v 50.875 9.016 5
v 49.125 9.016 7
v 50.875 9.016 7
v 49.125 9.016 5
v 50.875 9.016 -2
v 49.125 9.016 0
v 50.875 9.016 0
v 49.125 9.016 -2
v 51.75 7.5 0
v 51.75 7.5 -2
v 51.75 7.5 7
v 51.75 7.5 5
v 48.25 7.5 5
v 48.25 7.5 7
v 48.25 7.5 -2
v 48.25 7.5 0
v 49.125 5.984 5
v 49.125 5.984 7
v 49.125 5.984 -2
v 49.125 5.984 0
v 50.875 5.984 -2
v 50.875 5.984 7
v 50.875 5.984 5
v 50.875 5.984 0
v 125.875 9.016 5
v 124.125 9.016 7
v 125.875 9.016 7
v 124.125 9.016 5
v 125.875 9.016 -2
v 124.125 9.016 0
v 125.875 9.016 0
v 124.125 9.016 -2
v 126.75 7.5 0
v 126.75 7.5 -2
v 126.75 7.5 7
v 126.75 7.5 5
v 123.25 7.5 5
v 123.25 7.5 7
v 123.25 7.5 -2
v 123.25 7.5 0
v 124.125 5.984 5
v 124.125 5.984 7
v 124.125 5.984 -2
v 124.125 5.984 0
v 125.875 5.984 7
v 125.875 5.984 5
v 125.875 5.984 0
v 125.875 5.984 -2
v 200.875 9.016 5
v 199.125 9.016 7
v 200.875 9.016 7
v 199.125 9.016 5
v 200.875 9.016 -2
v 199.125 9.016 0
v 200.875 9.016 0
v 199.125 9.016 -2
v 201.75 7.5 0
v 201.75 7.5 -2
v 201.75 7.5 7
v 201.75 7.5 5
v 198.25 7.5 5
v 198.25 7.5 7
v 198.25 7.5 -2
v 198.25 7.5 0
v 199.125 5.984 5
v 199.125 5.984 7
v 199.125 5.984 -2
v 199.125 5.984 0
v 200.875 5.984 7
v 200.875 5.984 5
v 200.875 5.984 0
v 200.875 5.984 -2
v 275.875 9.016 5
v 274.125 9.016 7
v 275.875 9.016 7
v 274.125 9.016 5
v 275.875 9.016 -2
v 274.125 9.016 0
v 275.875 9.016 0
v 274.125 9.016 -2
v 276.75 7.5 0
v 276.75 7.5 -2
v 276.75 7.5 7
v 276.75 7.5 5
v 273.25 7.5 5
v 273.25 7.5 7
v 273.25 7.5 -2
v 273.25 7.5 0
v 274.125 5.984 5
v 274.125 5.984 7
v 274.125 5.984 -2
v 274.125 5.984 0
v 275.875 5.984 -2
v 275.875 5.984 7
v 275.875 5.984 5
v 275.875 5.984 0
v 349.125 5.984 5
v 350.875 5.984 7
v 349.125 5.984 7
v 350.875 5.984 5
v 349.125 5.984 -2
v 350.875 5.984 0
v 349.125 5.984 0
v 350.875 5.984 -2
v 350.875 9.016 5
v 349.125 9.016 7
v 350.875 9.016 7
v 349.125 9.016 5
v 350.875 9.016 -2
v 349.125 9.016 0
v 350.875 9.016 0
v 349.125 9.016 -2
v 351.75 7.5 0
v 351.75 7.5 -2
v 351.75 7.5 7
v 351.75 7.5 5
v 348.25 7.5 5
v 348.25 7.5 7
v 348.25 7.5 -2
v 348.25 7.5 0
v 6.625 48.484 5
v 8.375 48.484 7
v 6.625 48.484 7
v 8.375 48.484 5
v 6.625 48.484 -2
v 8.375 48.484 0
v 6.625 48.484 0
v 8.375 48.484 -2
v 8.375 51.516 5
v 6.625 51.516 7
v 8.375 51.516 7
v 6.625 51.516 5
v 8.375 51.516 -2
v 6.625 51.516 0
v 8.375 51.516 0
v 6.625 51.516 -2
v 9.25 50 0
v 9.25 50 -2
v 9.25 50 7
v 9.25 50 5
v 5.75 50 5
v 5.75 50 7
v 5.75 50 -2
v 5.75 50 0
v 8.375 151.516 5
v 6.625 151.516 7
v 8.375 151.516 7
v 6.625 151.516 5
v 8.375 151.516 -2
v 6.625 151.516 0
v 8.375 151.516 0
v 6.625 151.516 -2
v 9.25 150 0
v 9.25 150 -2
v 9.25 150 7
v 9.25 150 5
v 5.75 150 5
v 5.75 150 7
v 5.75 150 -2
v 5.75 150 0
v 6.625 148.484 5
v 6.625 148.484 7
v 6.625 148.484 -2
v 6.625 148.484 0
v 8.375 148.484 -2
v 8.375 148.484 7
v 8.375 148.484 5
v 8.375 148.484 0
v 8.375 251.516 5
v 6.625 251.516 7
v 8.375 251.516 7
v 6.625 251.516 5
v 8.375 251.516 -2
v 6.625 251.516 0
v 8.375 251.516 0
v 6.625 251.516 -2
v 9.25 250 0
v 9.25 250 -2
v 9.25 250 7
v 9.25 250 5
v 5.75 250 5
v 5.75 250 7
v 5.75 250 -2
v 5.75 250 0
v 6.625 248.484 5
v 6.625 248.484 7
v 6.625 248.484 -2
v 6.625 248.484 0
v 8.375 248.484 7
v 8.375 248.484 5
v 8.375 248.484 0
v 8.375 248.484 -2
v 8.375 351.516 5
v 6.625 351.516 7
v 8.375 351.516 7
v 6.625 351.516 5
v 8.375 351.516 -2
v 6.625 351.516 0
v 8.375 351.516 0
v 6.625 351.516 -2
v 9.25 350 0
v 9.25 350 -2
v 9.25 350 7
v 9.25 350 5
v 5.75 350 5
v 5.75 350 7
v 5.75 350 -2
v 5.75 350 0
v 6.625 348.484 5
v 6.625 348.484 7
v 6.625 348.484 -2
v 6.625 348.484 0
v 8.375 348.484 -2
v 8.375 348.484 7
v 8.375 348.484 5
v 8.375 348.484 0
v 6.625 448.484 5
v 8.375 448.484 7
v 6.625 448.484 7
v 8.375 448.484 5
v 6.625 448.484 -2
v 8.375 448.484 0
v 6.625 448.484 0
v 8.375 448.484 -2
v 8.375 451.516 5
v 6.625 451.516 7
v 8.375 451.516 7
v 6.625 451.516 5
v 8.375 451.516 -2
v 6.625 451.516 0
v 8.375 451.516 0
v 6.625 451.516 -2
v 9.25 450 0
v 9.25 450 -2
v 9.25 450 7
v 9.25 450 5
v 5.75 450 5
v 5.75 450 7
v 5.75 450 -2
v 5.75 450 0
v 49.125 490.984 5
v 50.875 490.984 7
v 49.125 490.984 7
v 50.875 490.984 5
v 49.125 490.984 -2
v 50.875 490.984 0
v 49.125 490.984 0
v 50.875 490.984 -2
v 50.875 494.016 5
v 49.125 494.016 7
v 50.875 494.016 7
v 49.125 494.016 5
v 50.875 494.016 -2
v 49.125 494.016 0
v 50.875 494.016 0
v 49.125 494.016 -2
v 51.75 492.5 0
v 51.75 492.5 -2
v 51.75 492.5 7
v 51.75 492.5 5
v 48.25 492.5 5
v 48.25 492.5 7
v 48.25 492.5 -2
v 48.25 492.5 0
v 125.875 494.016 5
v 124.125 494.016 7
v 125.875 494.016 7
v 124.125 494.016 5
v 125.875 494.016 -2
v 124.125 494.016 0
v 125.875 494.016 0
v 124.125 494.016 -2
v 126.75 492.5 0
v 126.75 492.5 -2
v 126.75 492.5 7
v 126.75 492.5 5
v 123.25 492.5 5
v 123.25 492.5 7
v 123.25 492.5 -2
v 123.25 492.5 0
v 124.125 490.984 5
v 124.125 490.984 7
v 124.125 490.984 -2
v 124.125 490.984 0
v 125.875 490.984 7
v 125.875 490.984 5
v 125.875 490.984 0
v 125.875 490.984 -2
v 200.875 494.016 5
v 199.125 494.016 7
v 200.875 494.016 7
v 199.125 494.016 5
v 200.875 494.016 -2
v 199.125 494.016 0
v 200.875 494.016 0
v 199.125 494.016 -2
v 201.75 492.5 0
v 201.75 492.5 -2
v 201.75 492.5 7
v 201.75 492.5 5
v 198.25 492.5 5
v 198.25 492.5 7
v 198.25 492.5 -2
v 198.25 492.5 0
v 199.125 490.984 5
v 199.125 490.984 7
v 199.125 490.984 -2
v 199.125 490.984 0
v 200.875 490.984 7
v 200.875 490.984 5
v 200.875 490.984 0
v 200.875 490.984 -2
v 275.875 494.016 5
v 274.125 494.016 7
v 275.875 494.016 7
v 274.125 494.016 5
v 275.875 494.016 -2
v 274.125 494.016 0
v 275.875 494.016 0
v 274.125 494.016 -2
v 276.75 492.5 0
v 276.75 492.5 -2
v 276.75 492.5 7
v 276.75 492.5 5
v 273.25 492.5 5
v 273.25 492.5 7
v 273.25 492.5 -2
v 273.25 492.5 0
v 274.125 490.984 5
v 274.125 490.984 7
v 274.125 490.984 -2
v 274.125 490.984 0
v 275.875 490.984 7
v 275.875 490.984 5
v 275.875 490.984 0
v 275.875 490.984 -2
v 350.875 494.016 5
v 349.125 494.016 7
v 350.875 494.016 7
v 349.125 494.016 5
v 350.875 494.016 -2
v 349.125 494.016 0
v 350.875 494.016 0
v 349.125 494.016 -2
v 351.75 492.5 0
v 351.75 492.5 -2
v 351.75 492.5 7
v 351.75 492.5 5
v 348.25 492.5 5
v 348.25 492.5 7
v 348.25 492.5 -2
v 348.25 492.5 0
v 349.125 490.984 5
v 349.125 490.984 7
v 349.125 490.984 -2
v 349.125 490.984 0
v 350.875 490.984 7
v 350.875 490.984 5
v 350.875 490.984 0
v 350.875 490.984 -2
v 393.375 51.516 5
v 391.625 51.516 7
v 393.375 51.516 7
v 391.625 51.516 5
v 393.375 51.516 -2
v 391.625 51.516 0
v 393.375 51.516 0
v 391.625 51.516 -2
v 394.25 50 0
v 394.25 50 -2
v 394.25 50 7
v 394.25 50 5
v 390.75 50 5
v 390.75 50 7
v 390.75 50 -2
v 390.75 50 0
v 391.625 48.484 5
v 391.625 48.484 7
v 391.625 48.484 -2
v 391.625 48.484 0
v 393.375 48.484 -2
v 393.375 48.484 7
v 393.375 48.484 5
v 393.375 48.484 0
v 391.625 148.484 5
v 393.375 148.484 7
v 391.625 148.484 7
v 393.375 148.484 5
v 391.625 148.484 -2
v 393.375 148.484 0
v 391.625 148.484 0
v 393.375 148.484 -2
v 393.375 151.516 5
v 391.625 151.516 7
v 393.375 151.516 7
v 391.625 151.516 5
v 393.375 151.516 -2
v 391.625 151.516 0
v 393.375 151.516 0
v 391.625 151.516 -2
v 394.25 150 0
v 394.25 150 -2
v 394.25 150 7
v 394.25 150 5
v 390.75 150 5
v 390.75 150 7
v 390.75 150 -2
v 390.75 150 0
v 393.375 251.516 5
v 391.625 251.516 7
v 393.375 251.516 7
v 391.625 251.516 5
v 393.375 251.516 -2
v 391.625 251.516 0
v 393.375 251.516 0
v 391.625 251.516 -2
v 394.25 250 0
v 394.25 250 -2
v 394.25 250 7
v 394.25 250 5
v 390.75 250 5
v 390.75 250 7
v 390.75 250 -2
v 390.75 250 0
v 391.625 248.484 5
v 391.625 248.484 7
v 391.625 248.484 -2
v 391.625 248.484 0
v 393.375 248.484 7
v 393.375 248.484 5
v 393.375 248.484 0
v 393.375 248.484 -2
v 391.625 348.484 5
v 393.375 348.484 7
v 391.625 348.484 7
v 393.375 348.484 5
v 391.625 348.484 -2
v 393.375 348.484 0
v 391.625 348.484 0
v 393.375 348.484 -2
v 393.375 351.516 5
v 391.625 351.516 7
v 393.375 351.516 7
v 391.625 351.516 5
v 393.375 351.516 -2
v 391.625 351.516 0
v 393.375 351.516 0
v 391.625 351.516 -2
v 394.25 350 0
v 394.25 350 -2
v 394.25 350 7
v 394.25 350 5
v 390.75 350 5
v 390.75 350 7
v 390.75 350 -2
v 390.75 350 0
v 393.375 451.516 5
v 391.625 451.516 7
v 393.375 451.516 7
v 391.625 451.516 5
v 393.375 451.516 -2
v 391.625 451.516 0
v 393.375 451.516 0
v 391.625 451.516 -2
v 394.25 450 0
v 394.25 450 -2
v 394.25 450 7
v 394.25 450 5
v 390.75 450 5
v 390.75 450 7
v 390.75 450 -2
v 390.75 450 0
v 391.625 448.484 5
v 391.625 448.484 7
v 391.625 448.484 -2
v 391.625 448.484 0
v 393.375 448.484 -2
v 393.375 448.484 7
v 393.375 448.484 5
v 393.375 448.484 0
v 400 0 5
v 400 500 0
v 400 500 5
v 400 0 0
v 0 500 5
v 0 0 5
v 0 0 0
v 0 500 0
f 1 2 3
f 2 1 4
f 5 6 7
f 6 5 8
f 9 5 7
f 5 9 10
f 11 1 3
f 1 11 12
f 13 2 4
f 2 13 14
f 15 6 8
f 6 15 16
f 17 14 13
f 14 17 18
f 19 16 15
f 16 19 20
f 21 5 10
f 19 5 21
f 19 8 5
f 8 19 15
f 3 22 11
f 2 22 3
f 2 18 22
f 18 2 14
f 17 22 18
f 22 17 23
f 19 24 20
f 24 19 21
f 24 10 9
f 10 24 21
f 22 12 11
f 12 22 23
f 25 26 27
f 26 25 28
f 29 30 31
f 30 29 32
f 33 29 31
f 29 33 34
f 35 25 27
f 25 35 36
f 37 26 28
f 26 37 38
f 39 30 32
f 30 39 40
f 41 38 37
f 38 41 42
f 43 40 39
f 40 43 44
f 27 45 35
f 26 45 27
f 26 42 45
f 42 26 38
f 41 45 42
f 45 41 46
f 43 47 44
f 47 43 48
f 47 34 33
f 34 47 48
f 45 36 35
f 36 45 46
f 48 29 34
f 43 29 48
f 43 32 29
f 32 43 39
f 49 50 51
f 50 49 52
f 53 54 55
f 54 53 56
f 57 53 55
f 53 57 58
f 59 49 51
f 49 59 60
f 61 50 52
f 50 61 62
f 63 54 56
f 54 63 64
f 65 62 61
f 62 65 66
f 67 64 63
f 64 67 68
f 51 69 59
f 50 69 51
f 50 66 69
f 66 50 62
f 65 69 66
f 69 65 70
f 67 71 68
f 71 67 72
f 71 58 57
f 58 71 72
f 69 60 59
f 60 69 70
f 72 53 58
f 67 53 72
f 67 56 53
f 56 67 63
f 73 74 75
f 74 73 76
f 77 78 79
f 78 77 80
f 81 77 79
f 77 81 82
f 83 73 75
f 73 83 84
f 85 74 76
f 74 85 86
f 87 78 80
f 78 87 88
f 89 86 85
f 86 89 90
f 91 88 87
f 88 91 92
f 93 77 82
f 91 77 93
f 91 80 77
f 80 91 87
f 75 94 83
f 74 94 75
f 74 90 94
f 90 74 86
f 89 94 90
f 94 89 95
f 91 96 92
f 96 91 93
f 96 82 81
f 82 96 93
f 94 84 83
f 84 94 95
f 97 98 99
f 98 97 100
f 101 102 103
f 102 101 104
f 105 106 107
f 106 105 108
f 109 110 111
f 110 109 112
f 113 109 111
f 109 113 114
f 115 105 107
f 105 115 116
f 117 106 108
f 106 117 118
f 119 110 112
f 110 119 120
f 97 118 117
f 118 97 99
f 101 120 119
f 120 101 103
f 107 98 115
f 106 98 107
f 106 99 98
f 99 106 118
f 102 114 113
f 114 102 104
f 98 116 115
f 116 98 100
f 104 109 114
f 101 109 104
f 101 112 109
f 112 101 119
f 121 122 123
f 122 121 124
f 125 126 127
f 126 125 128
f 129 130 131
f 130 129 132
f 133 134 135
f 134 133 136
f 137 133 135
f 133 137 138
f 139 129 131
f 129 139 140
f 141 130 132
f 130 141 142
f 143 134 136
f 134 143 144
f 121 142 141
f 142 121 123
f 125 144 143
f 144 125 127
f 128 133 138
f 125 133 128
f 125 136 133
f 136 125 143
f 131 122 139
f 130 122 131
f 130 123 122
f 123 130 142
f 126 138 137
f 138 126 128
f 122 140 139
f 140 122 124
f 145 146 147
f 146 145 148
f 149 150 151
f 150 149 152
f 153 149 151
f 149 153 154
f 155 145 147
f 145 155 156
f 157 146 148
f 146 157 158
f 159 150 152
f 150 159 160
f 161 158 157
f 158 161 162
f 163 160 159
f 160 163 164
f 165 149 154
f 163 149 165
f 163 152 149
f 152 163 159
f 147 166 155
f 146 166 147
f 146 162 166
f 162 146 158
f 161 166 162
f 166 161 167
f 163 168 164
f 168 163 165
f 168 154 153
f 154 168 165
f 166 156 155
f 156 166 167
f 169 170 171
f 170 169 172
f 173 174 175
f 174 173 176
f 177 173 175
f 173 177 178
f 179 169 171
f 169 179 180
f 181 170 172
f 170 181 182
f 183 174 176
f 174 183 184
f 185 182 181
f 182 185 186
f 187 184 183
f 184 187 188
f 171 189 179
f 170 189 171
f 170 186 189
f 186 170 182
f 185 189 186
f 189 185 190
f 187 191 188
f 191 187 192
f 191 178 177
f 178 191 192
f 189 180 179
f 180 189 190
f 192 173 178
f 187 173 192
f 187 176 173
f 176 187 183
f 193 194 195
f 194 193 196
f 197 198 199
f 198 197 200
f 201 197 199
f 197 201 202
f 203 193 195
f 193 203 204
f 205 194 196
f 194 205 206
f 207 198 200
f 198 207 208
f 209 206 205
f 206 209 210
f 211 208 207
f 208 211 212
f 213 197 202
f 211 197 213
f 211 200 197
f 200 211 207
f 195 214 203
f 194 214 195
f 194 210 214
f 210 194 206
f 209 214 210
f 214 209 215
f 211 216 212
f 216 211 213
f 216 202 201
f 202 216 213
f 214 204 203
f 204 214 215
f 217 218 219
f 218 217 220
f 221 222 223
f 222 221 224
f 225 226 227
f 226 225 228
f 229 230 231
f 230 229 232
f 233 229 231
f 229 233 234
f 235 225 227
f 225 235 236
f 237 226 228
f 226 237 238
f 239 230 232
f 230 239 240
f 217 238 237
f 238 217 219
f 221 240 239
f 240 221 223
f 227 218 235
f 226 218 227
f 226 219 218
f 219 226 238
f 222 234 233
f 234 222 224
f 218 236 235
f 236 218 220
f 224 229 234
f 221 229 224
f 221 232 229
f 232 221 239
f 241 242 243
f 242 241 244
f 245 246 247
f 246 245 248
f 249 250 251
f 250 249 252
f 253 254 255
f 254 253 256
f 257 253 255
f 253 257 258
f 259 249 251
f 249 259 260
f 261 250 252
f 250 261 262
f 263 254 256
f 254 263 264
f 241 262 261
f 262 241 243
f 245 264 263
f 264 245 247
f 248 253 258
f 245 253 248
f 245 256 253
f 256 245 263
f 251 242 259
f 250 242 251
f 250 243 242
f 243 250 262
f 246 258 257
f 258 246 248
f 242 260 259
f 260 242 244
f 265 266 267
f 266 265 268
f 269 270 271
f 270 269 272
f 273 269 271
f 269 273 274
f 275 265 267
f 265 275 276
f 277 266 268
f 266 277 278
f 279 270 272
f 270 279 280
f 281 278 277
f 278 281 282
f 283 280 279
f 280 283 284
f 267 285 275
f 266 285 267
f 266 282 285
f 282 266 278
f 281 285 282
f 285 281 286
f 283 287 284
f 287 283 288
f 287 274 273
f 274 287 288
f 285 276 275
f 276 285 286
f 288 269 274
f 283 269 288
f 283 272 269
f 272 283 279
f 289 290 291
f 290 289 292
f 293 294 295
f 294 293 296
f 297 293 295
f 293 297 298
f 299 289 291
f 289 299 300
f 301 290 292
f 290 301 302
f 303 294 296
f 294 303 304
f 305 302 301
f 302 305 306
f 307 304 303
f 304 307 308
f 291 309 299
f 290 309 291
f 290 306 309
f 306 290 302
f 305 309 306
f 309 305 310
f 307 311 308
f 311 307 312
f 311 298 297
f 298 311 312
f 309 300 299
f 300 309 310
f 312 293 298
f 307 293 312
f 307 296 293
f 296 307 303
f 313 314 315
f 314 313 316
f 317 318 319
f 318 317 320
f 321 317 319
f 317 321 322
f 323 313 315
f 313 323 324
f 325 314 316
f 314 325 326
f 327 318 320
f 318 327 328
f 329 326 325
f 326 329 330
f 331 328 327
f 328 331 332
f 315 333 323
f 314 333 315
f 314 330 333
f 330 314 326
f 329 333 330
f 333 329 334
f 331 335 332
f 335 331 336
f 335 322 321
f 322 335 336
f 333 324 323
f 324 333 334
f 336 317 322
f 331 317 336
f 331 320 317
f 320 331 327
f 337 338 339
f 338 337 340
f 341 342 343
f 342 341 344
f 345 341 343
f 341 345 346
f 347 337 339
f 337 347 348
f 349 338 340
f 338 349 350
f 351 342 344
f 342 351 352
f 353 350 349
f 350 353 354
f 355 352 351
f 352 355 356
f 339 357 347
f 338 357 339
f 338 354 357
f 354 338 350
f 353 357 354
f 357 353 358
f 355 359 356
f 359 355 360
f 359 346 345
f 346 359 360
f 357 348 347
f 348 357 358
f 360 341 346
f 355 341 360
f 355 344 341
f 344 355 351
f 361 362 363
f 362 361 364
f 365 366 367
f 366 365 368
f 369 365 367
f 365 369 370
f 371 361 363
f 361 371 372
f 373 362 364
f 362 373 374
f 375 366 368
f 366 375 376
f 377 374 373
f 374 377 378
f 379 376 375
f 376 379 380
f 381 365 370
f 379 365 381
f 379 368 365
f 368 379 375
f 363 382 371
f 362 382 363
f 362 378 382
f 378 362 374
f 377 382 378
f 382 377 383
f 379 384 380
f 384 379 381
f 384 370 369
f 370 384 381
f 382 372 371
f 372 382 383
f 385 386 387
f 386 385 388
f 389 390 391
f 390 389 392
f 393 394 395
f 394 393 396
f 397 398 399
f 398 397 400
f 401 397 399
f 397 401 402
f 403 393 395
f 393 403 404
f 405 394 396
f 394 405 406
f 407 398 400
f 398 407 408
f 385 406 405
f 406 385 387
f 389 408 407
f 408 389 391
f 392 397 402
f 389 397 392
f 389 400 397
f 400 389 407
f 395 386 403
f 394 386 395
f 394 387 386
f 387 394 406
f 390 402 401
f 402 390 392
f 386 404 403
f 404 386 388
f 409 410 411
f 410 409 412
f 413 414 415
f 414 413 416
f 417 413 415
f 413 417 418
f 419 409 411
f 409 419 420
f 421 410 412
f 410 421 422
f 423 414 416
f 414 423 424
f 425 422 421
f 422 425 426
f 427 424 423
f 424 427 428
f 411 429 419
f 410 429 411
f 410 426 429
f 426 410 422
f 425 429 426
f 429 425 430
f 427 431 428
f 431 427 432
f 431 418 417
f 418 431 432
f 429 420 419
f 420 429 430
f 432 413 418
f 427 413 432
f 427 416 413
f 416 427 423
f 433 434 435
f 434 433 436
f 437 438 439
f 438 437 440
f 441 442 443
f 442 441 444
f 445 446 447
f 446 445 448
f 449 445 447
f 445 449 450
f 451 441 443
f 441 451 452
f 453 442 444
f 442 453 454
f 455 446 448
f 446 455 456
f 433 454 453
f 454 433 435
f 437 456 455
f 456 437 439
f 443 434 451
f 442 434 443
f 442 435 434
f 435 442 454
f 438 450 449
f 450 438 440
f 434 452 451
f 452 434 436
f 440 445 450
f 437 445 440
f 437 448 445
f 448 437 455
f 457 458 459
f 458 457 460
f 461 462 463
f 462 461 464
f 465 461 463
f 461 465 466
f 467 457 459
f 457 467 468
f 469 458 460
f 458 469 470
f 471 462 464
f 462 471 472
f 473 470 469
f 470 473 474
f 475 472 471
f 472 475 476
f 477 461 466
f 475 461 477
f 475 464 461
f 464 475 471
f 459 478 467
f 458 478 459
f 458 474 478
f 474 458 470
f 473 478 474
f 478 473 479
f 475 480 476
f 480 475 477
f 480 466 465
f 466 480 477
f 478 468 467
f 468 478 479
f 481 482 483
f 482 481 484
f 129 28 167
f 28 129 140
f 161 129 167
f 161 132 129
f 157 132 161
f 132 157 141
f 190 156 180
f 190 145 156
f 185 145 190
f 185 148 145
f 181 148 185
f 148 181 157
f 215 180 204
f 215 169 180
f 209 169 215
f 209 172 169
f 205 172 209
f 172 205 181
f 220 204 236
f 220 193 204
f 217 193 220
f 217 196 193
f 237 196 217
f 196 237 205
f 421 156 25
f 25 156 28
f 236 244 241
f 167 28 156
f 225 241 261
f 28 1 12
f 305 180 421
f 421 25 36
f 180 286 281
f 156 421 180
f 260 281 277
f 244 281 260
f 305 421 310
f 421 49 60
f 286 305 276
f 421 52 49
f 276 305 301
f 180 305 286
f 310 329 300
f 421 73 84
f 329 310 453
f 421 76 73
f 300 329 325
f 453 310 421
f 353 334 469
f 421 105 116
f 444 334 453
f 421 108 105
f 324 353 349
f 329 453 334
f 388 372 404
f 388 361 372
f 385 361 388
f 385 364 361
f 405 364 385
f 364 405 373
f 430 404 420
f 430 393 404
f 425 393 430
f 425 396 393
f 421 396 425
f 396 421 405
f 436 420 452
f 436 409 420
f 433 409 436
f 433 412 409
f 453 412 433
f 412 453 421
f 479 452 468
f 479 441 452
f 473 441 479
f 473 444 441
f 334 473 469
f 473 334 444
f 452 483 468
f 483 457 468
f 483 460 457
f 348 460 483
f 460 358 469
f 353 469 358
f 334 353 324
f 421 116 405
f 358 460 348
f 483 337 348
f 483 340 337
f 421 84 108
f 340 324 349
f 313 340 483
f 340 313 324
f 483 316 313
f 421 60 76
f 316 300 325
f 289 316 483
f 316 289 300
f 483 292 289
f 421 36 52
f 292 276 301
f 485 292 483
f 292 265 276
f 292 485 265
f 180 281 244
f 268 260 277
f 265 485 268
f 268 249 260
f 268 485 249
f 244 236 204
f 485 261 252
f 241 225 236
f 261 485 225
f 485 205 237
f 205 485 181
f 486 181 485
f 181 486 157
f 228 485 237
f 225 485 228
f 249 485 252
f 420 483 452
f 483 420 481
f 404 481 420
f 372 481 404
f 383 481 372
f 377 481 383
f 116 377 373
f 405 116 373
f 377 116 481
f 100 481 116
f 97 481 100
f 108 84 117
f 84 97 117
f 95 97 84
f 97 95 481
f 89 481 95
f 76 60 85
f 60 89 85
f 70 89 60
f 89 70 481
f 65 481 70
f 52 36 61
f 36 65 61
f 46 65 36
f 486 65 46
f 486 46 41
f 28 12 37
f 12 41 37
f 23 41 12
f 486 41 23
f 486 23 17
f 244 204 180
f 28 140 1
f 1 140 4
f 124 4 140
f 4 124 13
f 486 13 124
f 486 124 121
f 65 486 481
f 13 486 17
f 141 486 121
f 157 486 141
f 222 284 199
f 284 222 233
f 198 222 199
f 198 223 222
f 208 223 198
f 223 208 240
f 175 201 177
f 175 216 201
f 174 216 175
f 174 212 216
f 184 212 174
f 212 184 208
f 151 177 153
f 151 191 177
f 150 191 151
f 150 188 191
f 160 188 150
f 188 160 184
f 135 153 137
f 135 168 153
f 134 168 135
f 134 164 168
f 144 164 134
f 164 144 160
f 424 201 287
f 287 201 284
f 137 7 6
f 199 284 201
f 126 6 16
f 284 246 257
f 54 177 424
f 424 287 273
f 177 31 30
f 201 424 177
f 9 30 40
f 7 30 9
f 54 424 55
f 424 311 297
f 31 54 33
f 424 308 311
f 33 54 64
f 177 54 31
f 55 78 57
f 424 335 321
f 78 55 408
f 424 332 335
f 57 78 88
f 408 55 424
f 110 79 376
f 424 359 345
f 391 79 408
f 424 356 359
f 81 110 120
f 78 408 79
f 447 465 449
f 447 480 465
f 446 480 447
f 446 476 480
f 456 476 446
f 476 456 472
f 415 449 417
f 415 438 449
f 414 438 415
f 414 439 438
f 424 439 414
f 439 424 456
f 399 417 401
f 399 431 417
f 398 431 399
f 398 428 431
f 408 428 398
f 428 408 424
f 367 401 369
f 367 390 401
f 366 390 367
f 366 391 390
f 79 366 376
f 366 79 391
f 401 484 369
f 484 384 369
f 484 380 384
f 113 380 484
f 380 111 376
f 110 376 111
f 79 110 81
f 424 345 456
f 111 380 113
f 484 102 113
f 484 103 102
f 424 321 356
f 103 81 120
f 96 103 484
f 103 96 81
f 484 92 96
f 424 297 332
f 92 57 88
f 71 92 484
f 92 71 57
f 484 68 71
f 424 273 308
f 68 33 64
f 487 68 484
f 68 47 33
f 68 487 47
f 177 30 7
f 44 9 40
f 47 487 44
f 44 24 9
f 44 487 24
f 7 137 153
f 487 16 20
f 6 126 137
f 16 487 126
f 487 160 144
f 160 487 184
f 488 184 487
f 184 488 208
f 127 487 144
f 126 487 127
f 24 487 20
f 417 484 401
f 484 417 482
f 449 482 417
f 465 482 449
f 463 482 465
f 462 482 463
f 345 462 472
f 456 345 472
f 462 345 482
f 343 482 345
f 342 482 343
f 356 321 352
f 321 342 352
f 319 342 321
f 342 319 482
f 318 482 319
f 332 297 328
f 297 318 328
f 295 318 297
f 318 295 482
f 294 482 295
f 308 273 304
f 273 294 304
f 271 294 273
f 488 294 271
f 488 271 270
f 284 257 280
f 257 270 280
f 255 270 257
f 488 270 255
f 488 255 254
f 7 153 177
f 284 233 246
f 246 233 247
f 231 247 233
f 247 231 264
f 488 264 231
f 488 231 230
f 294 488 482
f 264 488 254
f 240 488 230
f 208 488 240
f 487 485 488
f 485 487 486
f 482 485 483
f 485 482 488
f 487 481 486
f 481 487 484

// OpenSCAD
//module motorholes(x,y)
screwholeradius=1.75;
extrusion=15;
z=5;
screwholesX=5;
screwholesY=5;
holefromedge=50;

x=400;
gapX=(x-100)/(screwholesX-1);
y=500;
gapY=(y-100)/(screwholesY-1);

cube([x,y,z]);

 for (a =[0:(screwholesX-1)])
 { translate ([holefromedge+(gapX*a),extrusion/2,-2]) cylinder(z+4, screwholeradius,screwholeradius); }
   for (a =[0:(screwholesY-1)])
 { translate ([extrusion/2,holefromedge+(gapY*a),-2]) cylinder(z+4, screwholeradius,screwholeradius); }
  for (a =[0:(screwholesX-1)])
 { translate ([holefromedge+(gapX*a),y-extrusion/2,-2]) cylinder(z+4, screwholeradius,screwholeradius); }
    for (a =[0:(screwholesY-1)])
 { translate ([x-extrusion/2,holefromedge+(gapY*a),-2]) cylinder(z+4, screwholeradius,screwholeradius); }
